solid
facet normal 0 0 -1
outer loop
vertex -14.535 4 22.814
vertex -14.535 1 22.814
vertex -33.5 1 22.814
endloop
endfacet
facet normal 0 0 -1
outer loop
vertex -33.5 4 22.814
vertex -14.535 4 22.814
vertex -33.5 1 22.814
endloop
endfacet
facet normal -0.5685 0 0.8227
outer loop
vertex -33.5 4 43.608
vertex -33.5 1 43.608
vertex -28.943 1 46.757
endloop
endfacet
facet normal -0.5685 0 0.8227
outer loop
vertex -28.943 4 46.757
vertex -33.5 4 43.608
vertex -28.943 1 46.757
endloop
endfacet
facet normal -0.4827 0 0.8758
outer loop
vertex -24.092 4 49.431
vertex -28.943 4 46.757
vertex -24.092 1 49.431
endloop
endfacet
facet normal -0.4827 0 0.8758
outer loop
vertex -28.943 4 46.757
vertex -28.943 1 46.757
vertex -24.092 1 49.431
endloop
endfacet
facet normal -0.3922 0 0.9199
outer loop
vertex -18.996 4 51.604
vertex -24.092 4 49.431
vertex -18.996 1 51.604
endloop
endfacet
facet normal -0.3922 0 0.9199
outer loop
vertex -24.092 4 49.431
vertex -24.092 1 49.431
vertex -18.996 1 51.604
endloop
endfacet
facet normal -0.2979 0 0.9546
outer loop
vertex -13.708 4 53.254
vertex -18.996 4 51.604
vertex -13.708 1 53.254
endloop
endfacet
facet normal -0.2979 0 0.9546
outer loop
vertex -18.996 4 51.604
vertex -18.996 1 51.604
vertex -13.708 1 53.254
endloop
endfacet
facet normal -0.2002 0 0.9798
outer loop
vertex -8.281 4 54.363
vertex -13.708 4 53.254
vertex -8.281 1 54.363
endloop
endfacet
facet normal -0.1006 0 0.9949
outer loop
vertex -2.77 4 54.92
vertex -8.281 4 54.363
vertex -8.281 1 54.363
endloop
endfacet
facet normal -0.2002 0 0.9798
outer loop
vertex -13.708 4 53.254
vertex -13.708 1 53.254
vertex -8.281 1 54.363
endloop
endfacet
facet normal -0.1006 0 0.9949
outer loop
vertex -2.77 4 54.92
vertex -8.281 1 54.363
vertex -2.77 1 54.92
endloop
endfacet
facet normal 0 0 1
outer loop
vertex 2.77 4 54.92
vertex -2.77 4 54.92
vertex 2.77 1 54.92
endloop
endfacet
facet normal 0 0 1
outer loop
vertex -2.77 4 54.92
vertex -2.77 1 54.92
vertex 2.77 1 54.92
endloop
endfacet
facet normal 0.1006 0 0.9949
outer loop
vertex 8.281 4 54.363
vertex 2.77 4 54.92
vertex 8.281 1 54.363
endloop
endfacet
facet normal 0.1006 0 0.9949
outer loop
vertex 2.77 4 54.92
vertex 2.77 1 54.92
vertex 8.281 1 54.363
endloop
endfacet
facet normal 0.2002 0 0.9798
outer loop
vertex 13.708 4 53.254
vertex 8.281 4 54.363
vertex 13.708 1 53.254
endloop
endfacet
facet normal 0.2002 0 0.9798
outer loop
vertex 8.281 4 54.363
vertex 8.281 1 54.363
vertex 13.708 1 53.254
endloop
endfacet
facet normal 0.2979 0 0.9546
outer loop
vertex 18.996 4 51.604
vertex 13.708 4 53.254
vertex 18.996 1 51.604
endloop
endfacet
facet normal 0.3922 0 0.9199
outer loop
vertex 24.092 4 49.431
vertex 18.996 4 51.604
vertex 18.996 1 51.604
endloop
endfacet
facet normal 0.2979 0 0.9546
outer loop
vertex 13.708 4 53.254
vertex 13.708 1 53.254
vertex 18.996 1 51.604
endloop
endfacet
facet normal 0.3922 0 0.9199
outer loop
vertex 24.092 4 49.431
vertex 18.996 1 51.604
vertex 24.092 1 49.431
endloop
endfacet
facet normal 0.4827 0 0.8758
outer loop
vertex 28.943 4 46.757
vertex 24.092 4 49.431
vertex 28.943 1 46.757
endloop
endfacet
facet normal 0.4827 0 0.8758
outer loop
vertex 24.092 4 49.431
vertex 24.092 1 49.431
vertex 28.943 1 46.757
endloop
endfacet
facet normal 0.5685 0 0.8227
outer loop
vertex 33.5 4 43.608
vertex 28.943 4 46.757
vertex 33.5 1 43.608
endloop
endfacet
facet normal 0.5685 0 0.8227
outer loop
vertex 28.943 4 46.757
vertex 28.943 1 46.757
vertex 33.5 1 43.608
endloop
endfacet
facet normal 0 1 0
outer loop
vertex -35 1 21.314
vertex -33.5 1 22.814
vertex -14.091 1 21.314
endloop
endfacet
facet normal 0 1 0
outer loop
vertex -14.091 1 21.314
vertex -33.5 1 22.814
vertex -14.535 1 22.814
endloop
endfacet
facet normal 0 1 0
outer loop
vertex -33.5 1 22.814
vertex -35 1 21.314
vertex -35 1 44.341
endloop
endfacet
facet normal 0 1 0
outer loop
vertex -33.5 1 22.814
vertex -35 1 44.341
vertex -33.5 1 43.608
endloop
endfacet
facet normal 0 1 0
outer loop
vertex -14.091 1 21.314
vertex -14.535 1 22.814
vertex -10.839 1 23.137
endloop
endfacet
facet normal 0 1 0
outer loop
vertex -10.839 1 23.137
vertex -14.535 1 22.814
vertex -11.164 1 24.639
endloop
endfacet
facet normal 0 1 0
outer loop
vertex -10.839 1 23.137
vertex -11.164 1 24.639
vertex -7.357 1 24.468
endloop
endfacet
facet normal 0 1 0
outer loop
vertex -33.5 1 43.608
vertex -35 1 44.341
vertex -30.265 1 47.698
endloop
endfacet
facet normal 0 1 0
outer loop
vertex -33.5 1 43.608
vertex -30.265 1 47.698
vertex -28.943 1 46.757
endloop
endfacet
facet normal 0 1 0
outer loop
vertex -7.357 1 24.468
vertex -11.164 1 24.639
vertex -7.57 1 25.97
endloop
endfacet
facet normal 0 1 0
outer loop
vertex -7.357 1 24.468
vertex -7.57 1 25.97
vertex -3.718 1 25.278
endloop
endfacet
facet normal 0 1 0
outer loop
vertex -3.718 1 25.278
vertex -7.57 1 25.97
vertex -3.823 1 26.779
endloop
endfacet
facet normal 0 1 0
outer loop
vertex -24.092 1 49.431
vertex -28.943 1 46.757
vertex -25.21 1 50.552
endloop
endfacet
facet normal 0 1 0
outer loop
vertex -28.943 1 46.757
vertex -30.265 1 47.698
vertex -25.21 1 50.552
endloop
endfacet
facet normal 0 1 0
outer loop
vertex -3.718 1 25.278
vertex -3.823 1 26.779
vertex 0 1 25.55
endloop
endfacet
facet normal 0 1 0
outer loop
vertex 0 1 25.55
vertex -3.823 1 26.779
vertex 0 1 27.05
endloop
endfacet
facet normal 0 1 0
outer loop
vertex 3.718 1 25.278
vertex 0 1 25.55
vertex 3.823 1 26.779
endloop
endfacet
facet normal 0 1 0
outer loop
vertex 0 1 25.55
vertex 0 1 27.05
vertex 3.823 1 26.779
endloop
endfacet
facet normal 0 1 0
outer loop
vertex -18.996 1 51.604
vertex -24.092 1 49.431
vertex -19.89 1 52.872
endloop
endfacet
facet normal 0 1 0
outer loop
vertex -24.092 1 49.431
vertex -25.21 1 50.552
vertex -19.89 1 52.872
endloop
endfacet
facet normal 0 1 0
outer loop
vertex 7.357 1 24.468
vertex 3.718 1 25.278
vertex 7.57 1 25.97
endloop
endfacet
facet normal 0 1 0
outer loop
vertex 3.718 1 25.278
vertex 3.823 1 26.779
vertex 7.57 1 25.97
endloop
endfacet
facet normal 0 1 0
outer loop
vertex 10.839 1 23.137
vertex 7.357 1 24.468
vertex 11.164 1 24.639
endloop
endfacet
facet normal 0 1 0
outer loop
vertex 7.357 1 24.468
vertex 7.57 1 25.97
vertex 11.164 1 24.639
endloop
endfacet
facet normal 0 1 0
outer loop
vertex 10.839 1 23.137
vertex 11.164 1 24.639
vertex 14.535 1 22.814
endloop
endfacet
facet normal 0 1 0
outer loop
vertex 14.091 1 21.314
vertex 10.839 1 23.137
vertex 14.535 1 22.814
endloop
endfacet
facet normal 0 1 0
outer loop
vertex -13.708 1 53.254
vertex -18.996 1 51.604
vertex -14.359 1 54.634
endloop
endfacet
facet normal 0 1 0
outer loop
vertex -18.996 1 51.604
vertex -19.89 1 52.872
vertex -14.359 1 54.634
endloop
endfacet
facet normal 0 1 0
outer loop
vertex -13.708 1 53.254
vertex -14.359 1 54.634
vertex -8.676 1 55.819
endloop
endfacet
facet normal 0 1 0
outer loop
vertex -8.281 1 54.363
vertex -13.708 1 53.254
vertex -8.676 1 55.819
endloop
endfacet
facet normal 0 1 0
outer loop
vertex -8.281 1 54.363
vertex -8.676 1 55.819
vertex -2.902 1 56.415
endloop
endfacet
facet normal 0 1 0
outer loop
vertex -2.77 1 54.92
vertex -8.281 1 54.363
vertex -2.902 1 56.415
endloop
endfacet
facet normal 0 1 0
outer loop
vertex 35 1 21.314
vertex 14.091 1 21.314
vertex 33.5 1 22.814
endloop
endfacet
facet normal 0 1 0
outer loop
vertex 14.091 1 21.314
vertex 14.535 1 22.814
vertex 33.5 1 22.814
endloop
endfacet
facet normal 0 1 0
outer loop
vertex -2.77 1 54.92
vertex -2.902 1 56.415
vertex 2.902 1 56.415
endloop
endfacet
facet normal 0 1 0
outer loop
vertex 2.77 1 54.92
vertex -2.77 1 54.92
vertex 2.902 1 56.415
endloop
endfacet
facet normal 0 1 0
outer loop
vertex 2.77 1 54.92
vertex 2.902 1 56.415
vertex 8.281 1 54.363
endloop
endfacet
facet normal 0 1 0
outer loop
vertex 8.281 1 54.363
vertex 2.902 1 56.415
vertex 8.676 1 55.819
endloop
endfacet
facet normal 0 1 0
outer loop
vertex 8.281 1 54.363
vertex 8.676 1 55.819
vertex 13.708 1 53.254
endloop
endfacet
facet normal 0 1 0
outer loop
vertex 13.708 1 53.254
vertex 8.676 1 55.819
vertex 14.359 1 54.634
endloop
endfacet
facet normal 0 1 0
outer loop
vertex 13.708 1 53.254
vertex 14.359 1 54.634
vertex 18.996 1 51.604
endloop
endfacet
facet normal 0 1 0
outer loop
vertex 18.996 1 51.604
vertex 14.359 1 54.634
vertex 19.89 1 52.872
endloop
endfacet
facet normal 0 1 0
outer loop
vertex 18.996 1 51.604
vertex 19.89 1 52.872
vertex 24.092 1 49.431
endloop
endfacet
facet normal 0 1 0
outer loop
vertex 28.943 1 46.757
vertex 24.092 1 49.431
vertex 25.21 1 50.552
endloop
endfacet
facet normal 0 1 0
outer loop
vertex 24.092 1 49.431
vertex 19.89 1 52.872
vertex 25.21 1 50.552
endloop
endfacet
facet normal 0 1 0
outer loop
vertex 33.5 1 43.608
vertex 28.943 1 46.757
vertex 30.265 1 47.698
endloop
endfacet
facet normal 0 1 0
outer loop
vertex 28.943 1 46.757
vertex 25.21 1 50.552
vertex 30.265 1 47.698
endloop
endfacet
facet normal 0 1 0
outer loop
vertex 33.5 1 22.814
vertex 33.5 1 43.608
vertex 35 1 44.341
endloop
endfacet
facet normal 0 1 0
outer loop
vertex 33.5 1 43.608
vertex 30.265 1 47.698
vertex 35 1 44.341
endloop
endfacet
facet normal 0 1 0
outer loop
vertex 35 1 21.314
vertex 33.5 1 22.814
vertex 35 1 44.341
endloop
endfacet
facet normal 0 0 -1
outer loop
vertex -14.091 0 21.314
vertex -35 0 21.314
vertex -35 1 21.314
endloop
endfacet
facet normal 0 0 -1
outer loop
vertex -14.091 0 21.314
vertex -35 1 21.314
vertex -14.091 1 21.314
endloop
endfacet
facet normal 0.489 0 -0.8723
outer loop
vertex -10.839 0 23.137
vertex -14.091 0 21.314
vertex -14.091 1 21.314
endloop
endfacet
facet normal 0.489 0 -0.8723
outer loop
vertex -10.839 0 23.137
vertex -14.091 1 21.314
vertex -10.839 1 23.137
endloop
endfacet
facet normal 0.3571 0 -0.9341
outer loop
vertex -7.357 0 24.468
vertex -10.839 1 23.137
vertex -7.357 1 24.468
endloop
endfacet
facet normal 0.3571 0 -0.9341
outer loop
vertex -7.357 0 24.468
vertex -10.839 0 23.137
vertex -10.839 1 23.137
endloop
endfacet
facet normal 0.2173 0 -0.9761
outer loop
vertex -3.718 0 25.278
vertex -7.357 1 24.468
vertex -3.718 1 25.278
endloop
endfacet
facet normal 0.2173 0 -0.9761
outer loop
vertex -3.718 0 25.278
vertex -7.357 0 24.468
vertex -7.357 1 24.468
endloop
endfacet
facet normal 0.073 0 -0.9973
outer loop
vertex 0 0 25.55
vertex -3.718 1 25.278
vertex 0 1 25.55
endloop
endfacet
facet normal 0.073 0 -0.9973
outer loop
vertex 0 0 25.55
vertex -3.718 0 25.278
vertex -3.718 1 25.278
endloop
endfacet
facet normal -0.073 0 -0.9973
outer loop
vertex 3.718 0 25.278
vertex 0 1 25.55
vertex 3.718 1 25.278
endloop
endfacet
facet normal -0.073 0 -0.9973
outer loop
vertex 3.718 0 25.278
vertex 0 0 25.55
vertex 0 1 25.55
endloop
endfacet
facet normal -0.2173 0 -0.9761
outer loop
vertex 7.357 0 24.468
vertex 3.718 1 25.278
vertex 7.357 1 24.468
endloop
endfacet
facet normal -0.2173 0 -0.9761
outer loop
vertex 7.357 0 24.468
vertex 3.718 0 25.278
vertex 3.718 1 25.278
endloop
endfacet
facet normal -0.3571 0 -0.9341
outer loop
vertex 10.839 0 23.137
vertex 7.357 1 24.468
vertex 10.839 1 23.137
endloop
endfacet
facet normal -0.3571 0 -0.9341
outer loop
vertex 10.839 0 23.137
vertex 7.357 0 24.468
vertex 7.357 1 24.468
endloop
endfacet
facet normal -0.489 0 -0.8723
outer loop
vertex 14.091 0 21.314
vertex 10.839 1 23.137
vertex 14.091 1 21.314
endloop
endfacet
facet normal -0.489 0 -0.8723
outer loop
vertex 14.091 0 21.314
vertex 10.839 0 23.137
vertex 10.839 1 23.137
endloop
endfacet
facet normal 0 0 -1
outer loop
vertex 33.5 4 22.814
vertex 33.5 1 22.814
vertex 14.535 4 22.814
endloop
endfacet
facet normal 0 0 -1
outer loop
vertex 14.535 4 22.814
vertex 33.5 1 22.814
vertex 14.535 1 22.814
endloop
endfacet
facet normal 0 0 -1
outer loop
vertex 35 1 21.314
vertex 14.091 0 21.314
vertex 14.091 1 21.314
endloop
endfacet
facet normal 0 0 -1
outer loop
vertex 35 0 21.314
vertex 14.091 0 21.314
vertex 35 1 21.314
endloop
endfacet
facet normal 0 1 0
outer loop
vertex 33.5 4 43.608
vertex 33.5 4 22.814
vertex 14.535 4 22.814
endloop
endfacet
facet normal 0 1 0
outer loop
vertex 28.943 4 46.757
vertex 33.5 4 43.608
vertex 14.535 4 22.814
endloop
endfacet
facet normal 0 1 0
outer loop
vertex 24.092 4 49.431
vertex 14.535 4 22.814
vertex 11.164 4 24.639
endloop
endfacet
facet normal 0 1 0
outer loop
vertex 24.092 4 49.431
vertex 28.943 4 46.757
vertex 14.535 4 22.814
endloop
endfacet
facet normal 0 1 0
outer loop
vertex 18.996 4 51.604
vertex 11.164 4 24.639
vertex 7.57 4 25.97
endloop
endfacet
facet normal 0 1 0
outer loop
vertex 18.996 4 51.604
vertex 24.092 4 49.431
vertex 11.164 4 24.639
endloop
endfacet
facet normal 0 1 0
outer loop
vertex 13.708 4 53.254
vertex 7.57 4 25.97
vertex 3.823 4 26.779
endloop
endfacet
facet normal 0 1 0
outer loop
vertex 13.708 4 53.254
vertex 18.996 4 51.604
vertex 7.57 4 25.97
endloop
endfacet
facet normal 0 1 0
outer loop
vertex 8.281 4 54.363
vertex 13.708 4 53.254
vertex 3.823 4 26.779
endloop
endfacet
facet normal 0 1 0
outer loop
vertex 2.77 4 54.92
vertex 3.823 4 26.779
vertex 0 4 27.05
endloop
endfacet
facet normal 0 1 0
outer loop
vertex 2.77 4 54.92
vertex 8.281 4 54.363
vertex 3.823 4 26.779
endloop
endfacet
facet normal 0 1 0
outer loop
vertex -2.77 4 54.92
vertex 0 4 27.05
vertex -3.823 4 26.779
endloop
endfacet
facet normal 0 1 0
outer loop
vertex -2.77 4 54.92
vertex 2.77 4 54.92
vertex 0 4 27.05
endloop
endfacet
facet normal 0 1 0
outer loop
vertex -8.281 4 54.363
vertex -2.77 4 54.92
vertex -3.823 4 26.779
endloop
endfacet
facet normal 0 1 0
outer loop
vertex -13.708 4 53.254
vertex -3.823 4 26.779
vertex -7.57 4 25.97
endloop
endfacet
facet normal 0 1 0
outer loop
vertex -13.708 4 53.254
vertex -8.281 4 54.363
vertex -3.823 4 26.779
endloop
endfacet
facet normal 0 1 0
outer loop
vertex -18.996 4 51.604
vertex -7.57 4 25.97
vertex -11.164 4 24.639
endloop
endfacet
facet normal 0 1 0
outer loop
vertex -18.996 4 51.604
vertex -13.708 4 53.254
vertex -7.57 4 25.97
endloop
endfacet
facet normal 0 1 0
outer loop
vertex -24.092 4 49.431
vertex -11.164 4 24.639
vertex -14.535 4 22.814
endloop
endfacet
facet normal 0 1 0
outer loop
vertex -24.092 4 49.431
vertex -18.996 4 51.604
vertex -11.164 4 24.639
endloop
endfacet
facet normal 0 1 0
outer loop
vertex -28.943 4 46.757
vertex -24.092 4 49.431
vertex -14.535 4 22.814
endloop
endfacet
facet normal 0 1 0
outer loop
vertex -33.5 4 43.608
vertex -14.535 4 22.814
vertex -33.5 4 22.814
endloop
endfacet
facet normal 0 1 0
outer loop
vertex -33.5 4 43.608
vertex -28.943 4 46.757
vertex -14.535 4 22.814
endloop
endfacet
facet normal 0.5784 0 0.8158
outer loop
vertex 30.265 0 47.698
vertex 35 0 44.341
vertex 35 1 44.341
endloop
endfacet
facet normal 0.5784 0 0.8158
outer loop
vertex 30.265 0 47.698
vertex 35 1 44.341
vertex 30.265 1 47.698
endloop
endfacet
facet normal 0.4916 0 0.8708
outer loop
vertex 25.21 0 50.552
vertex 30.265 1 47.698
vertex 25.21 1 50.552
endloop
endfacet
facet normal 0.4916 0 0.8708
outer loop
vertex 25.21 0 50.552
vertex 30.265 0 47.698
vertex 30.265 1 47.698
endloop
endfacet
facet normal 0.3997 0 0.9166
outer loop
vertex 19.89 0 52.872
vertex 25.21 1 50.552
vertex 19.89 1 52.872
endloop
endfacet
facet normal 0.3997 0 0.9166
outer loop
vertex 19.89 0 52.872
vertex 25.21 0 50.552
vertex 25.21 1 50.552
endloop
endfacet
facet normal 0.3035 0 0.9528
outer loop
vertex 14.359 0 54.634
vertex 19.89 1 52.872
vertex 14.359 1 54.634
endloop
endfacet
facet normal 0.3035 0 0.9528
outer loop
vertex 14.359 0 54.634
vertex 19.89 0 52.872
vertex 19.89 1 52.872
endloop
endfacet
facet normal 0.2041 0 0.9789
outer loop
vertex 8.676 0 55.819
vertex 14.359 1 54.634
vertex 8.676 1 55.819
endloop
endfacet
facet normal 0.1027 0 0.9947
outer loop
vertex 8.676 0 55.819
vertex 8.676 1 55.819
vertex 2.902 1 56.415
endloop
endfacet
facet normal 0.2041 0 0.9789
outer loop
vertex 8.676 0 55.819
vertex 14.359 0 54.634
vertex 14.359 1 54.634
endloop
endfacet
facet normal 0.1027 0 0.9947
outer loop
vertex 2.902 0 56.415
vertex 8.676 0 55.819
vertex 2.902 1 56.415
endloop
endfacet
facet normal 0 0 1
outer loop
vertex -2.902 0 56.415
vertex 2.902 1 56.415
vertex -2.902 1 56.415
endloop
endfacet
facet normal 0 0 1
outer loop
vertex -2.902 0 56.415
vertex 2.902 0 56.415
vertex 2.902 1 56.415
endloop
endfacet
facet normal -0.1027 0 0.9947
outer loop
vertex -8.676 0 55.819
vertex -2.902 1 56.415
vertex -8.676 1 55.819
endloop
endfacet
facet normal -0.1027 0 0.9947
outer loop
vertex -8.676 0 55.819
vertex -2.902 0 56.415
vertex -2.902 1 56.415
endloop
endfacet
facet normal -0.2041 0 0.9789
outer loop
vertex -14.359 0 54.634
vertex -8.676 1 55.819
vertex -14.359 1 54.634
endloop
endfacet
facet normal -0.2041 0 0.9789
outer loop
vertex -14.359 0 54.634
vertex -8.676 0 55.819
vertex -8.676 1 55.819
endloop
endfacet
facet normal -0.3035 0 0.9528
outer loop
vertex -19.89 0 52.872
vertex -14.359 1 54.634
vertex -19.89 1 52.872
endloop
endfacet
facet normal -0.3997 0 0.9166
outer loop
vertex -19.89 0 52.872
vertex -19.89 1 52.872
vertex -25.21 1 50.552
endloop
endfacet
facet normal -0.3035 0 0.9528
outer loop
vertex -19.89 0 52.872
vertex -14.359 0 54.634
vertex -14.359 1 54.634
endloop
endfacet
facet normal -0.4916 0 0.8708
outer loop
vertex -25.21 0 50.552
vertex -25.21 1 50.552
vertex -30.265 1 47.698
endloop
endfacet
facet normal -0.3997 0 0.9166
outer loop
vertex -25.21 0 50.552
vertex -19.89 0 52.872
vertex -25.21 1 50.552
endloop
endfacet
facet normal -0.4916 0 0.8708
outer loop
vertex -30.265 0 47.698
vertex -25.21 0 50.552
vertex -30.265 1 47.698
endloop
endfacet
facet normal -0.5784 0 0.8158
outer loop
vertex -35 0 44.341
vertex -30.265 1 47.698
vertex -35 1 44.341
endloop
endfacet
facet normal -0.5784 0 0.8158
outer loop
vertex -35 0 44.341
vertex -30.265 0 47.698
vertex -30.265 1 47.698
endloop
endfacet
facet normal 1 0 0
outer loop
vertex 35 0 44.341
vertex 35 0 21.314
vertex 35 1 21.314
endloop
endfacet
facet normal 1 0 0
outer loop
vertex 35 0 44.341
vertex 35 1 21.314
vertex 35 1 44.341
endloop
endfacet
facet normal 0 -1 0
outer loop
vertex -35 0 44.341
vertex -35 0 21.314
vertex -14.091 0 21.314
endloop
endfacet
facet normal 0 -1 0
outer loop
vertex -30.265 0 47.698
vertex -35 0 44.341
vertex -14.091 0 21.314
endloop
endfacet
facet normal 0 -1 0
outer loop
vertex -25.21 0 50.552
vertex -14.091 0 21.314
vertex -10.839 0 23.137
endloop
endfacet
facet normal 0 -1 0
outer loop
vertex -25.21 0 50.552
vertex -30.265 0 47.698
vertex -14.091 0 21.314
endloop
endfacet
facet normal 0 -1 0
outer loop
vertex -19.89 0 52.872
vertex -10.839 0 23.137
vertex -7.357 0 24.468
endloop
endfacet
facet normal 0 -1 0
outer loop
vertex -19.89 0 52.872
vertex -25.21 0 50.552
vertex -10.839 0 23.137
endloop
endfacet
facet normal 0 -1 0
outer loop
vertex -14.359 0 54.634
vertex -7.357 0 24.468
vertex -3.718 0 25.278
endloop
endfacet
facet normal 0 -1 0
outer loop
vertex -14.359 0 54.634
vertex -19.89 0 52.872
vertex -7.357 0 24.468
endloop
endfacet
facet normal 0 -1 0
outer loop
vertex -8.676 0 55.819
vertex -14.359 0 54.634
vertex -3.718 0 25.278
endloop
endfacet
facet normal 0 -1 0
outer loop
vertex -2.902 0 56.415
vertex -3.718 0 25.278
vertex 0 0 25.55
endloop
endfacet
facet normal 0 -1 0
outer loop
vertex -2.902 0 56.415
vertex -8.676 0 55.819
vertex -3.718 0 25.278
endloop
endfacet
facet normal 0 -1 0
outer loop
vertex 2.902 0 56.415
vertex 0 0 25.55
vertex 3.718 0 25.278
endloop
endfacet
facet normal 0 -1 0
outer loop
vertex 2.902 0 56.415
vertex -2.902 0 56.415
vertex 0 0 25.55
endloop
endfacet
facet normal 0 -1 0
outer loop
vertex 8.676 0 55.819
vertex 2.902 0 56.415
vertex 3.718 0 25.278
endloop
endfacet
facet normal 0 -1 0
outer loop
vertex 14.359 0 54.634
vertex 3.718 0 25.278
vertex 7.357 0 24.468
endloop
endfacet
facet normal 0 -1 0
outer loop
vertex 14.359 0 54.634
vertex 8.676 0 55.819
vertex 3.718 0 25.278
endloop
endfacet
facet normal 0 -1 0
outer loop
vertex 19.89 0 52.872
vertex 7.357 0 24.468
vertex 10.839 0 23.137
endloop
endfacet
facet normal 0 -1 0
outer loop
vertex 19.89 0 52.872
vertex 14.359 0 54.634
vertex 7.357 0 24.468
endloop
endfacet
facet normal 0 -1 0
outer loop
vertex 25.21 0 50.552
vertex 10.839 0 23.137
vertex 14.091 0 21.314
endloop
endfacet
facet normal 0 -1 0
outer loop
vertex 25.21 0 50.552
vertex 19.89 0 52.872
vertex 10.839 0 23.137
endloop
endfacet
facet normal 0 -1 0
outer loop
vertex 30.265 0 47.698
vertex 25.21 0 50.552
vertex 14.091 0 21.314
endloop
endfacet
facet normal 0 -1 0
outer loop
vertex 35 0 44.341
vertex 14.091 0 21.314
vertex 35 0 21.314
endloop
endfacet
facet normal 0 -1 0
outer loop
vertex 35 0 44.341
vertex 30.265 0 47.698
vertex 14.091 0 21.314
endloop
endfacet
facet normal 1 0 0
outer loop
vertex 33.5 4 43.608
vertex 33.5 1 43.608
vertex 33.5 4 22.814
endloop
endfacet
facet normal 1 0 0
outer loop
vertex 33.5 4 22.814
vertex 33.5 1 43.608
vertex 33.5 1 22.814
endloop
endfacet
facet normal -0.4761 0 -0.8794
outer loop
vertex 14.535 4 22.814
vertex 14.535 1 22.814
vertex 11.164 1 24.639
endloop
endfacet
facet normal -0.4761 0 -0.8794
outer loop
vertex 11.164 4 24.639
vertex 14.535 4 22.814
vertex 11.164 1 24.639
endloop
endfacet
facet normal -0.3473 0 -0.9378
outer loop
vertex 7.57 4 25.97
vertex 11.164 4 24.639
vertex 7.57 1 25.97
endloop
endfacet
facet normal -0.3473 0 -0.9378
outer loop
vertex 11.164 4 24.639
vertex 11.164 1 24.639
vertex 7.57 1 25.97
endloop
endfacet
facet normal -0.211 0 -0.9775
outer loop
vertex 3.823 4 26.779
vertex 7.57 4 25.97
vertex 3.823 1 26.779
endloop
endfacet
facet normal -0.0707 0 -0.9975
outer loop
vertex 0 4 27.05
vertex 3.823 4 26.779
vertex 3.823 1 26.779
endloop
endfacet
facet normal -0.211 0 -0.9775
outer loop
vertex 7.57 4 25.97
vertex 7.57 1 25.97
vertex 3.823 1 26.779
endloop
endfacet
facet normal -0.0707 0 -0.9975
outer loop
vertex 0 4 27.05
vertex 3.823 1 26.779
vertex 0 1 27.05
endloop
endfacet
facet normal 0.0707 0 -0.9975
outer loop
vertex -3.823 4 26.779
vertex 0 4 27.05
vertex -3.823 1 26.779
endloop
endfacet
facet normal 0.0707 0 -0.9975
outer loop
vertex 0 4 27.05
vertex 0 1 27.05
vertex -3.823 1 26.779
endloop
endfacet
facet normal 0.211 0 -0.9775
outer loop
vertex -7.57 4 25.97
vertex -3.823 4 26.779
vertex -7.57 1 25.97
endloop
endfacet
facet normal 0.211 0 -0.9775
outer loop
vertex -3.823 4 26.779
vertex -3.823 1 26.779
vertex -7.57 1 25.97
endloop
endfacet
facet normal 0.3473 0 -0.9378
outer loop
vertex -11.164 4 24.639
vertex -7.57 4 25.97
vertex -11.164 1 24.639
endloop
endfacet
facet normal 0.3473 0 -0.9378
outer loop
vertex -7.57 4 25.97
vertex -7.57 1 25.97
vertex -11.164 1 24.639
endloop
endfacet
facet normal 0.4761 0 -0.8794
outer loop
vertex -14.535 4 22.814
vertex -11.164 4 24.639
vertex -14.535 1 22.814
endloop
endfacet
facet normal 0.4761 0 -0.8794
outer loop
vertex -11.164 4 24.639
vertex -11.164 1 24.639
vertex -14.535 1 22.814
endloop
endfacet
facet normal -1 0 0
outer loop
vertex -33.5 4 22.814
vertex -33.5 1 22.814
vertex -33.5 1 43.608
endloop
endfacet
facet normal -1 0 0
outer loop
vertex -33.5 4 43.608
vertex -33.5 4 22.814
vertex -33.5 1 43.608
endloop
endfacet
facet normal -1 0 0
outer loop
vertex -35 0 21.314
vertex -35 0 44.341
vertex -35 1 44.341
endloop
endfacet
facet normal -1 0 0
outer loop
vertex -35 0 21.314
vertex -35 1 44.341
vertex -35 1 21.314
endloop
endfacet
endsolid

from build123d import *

# Parameters (mm, degrees)
F1_DEPTH = 1
F3_DEPTH = 3


with BuildPart() as f1:
    # F0 (on Front) → F1 (new body)
    with BuildSketch(Plane.XZ):
        with BuildLine():
            Line((14.090503, 21.313837), (35, 21.313837))
            Line((35, 21.313837), (35, 44.340667))
            ThreePointArc((35, 44.340667), (0, 56.489775), (-35, 44.340667))
            Line((-35, 44.340667), (-35, 21.313837))
            Line((-35, 21.313837), (-14.090503, 21.313837))
            ThreePointArc((-14.090503, 21.313837), (0, 25.55038), (14.090503, 21.313837))
        make_face()
    extrude(amount=-F1_DEPTH)

    # F2 (on face) → F3 (join)
    with BuildSketch(Plane(origin=(0, 1, 0), x_dir=(-1, 0, 0), z_dir=(0, 1, 0))):
        with BuildLine():
            ThreePointArc((33.5, 43.607628), (-1e-06, 54.989774), (-33.500001, 43.607627))
            Line((-33.500001, 43.607627), (-33.500001, 22.813837))
            Line((-33.500001, 22.813837), (-14.534507, 22.813837))
            ThreePointArc((-14.534507, 22.813837), (0, 27.05038), (14.534507, 22.813837))
            Line((14.534507, 22.813837), (33.5, 22.813837))
            Line((33.5, 22.813837), (33.5, 43.607628))
        make_face()
    extrude(amount=F3_DEPTH)


solid = f1.part
